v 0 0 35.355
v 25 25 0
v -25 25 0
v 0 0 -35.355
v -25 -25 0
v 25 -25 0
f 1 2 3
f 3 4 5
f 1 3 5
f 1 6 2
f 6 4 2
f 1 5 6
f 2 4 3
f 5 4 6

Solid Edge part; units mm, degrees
sketch "Sketch1" plane through (0, 0, 0) normal (0, 0, 1) x (1, 0, 0)
  line L0 (25, -25) -> (25, 25)
  line L1 (25, 25) -> (-25, 25)
  line L2 (-25, 25) -> (-25, -25)
  line L3 (-25, -25) -> (25, -25)
extrude "Protrusion1" add sketch "Sketch1" along normal blind 93.2781
sketch "Sketch2" plane through (0, 0, 0) normal (1, 0, 0) x (0, 1, 0)
  line L0 (-25, 0) -> (0, 35.3553)
extrude "Cutout1" cut sketch "Sketch2" along normal up to next and the other way up to next material side at (0, -12.5408, 17.7065)
pattern_circular "Pattern1" count 4 over 360 about axis through (0, 0, 0) along (0, 0, 1) of "Cutout1"
mirror "Mirror1" about plane through (0, 0, 0) normal (0, 0, 1) of "Protrusion1", "Cutout1", "Pattern1"
